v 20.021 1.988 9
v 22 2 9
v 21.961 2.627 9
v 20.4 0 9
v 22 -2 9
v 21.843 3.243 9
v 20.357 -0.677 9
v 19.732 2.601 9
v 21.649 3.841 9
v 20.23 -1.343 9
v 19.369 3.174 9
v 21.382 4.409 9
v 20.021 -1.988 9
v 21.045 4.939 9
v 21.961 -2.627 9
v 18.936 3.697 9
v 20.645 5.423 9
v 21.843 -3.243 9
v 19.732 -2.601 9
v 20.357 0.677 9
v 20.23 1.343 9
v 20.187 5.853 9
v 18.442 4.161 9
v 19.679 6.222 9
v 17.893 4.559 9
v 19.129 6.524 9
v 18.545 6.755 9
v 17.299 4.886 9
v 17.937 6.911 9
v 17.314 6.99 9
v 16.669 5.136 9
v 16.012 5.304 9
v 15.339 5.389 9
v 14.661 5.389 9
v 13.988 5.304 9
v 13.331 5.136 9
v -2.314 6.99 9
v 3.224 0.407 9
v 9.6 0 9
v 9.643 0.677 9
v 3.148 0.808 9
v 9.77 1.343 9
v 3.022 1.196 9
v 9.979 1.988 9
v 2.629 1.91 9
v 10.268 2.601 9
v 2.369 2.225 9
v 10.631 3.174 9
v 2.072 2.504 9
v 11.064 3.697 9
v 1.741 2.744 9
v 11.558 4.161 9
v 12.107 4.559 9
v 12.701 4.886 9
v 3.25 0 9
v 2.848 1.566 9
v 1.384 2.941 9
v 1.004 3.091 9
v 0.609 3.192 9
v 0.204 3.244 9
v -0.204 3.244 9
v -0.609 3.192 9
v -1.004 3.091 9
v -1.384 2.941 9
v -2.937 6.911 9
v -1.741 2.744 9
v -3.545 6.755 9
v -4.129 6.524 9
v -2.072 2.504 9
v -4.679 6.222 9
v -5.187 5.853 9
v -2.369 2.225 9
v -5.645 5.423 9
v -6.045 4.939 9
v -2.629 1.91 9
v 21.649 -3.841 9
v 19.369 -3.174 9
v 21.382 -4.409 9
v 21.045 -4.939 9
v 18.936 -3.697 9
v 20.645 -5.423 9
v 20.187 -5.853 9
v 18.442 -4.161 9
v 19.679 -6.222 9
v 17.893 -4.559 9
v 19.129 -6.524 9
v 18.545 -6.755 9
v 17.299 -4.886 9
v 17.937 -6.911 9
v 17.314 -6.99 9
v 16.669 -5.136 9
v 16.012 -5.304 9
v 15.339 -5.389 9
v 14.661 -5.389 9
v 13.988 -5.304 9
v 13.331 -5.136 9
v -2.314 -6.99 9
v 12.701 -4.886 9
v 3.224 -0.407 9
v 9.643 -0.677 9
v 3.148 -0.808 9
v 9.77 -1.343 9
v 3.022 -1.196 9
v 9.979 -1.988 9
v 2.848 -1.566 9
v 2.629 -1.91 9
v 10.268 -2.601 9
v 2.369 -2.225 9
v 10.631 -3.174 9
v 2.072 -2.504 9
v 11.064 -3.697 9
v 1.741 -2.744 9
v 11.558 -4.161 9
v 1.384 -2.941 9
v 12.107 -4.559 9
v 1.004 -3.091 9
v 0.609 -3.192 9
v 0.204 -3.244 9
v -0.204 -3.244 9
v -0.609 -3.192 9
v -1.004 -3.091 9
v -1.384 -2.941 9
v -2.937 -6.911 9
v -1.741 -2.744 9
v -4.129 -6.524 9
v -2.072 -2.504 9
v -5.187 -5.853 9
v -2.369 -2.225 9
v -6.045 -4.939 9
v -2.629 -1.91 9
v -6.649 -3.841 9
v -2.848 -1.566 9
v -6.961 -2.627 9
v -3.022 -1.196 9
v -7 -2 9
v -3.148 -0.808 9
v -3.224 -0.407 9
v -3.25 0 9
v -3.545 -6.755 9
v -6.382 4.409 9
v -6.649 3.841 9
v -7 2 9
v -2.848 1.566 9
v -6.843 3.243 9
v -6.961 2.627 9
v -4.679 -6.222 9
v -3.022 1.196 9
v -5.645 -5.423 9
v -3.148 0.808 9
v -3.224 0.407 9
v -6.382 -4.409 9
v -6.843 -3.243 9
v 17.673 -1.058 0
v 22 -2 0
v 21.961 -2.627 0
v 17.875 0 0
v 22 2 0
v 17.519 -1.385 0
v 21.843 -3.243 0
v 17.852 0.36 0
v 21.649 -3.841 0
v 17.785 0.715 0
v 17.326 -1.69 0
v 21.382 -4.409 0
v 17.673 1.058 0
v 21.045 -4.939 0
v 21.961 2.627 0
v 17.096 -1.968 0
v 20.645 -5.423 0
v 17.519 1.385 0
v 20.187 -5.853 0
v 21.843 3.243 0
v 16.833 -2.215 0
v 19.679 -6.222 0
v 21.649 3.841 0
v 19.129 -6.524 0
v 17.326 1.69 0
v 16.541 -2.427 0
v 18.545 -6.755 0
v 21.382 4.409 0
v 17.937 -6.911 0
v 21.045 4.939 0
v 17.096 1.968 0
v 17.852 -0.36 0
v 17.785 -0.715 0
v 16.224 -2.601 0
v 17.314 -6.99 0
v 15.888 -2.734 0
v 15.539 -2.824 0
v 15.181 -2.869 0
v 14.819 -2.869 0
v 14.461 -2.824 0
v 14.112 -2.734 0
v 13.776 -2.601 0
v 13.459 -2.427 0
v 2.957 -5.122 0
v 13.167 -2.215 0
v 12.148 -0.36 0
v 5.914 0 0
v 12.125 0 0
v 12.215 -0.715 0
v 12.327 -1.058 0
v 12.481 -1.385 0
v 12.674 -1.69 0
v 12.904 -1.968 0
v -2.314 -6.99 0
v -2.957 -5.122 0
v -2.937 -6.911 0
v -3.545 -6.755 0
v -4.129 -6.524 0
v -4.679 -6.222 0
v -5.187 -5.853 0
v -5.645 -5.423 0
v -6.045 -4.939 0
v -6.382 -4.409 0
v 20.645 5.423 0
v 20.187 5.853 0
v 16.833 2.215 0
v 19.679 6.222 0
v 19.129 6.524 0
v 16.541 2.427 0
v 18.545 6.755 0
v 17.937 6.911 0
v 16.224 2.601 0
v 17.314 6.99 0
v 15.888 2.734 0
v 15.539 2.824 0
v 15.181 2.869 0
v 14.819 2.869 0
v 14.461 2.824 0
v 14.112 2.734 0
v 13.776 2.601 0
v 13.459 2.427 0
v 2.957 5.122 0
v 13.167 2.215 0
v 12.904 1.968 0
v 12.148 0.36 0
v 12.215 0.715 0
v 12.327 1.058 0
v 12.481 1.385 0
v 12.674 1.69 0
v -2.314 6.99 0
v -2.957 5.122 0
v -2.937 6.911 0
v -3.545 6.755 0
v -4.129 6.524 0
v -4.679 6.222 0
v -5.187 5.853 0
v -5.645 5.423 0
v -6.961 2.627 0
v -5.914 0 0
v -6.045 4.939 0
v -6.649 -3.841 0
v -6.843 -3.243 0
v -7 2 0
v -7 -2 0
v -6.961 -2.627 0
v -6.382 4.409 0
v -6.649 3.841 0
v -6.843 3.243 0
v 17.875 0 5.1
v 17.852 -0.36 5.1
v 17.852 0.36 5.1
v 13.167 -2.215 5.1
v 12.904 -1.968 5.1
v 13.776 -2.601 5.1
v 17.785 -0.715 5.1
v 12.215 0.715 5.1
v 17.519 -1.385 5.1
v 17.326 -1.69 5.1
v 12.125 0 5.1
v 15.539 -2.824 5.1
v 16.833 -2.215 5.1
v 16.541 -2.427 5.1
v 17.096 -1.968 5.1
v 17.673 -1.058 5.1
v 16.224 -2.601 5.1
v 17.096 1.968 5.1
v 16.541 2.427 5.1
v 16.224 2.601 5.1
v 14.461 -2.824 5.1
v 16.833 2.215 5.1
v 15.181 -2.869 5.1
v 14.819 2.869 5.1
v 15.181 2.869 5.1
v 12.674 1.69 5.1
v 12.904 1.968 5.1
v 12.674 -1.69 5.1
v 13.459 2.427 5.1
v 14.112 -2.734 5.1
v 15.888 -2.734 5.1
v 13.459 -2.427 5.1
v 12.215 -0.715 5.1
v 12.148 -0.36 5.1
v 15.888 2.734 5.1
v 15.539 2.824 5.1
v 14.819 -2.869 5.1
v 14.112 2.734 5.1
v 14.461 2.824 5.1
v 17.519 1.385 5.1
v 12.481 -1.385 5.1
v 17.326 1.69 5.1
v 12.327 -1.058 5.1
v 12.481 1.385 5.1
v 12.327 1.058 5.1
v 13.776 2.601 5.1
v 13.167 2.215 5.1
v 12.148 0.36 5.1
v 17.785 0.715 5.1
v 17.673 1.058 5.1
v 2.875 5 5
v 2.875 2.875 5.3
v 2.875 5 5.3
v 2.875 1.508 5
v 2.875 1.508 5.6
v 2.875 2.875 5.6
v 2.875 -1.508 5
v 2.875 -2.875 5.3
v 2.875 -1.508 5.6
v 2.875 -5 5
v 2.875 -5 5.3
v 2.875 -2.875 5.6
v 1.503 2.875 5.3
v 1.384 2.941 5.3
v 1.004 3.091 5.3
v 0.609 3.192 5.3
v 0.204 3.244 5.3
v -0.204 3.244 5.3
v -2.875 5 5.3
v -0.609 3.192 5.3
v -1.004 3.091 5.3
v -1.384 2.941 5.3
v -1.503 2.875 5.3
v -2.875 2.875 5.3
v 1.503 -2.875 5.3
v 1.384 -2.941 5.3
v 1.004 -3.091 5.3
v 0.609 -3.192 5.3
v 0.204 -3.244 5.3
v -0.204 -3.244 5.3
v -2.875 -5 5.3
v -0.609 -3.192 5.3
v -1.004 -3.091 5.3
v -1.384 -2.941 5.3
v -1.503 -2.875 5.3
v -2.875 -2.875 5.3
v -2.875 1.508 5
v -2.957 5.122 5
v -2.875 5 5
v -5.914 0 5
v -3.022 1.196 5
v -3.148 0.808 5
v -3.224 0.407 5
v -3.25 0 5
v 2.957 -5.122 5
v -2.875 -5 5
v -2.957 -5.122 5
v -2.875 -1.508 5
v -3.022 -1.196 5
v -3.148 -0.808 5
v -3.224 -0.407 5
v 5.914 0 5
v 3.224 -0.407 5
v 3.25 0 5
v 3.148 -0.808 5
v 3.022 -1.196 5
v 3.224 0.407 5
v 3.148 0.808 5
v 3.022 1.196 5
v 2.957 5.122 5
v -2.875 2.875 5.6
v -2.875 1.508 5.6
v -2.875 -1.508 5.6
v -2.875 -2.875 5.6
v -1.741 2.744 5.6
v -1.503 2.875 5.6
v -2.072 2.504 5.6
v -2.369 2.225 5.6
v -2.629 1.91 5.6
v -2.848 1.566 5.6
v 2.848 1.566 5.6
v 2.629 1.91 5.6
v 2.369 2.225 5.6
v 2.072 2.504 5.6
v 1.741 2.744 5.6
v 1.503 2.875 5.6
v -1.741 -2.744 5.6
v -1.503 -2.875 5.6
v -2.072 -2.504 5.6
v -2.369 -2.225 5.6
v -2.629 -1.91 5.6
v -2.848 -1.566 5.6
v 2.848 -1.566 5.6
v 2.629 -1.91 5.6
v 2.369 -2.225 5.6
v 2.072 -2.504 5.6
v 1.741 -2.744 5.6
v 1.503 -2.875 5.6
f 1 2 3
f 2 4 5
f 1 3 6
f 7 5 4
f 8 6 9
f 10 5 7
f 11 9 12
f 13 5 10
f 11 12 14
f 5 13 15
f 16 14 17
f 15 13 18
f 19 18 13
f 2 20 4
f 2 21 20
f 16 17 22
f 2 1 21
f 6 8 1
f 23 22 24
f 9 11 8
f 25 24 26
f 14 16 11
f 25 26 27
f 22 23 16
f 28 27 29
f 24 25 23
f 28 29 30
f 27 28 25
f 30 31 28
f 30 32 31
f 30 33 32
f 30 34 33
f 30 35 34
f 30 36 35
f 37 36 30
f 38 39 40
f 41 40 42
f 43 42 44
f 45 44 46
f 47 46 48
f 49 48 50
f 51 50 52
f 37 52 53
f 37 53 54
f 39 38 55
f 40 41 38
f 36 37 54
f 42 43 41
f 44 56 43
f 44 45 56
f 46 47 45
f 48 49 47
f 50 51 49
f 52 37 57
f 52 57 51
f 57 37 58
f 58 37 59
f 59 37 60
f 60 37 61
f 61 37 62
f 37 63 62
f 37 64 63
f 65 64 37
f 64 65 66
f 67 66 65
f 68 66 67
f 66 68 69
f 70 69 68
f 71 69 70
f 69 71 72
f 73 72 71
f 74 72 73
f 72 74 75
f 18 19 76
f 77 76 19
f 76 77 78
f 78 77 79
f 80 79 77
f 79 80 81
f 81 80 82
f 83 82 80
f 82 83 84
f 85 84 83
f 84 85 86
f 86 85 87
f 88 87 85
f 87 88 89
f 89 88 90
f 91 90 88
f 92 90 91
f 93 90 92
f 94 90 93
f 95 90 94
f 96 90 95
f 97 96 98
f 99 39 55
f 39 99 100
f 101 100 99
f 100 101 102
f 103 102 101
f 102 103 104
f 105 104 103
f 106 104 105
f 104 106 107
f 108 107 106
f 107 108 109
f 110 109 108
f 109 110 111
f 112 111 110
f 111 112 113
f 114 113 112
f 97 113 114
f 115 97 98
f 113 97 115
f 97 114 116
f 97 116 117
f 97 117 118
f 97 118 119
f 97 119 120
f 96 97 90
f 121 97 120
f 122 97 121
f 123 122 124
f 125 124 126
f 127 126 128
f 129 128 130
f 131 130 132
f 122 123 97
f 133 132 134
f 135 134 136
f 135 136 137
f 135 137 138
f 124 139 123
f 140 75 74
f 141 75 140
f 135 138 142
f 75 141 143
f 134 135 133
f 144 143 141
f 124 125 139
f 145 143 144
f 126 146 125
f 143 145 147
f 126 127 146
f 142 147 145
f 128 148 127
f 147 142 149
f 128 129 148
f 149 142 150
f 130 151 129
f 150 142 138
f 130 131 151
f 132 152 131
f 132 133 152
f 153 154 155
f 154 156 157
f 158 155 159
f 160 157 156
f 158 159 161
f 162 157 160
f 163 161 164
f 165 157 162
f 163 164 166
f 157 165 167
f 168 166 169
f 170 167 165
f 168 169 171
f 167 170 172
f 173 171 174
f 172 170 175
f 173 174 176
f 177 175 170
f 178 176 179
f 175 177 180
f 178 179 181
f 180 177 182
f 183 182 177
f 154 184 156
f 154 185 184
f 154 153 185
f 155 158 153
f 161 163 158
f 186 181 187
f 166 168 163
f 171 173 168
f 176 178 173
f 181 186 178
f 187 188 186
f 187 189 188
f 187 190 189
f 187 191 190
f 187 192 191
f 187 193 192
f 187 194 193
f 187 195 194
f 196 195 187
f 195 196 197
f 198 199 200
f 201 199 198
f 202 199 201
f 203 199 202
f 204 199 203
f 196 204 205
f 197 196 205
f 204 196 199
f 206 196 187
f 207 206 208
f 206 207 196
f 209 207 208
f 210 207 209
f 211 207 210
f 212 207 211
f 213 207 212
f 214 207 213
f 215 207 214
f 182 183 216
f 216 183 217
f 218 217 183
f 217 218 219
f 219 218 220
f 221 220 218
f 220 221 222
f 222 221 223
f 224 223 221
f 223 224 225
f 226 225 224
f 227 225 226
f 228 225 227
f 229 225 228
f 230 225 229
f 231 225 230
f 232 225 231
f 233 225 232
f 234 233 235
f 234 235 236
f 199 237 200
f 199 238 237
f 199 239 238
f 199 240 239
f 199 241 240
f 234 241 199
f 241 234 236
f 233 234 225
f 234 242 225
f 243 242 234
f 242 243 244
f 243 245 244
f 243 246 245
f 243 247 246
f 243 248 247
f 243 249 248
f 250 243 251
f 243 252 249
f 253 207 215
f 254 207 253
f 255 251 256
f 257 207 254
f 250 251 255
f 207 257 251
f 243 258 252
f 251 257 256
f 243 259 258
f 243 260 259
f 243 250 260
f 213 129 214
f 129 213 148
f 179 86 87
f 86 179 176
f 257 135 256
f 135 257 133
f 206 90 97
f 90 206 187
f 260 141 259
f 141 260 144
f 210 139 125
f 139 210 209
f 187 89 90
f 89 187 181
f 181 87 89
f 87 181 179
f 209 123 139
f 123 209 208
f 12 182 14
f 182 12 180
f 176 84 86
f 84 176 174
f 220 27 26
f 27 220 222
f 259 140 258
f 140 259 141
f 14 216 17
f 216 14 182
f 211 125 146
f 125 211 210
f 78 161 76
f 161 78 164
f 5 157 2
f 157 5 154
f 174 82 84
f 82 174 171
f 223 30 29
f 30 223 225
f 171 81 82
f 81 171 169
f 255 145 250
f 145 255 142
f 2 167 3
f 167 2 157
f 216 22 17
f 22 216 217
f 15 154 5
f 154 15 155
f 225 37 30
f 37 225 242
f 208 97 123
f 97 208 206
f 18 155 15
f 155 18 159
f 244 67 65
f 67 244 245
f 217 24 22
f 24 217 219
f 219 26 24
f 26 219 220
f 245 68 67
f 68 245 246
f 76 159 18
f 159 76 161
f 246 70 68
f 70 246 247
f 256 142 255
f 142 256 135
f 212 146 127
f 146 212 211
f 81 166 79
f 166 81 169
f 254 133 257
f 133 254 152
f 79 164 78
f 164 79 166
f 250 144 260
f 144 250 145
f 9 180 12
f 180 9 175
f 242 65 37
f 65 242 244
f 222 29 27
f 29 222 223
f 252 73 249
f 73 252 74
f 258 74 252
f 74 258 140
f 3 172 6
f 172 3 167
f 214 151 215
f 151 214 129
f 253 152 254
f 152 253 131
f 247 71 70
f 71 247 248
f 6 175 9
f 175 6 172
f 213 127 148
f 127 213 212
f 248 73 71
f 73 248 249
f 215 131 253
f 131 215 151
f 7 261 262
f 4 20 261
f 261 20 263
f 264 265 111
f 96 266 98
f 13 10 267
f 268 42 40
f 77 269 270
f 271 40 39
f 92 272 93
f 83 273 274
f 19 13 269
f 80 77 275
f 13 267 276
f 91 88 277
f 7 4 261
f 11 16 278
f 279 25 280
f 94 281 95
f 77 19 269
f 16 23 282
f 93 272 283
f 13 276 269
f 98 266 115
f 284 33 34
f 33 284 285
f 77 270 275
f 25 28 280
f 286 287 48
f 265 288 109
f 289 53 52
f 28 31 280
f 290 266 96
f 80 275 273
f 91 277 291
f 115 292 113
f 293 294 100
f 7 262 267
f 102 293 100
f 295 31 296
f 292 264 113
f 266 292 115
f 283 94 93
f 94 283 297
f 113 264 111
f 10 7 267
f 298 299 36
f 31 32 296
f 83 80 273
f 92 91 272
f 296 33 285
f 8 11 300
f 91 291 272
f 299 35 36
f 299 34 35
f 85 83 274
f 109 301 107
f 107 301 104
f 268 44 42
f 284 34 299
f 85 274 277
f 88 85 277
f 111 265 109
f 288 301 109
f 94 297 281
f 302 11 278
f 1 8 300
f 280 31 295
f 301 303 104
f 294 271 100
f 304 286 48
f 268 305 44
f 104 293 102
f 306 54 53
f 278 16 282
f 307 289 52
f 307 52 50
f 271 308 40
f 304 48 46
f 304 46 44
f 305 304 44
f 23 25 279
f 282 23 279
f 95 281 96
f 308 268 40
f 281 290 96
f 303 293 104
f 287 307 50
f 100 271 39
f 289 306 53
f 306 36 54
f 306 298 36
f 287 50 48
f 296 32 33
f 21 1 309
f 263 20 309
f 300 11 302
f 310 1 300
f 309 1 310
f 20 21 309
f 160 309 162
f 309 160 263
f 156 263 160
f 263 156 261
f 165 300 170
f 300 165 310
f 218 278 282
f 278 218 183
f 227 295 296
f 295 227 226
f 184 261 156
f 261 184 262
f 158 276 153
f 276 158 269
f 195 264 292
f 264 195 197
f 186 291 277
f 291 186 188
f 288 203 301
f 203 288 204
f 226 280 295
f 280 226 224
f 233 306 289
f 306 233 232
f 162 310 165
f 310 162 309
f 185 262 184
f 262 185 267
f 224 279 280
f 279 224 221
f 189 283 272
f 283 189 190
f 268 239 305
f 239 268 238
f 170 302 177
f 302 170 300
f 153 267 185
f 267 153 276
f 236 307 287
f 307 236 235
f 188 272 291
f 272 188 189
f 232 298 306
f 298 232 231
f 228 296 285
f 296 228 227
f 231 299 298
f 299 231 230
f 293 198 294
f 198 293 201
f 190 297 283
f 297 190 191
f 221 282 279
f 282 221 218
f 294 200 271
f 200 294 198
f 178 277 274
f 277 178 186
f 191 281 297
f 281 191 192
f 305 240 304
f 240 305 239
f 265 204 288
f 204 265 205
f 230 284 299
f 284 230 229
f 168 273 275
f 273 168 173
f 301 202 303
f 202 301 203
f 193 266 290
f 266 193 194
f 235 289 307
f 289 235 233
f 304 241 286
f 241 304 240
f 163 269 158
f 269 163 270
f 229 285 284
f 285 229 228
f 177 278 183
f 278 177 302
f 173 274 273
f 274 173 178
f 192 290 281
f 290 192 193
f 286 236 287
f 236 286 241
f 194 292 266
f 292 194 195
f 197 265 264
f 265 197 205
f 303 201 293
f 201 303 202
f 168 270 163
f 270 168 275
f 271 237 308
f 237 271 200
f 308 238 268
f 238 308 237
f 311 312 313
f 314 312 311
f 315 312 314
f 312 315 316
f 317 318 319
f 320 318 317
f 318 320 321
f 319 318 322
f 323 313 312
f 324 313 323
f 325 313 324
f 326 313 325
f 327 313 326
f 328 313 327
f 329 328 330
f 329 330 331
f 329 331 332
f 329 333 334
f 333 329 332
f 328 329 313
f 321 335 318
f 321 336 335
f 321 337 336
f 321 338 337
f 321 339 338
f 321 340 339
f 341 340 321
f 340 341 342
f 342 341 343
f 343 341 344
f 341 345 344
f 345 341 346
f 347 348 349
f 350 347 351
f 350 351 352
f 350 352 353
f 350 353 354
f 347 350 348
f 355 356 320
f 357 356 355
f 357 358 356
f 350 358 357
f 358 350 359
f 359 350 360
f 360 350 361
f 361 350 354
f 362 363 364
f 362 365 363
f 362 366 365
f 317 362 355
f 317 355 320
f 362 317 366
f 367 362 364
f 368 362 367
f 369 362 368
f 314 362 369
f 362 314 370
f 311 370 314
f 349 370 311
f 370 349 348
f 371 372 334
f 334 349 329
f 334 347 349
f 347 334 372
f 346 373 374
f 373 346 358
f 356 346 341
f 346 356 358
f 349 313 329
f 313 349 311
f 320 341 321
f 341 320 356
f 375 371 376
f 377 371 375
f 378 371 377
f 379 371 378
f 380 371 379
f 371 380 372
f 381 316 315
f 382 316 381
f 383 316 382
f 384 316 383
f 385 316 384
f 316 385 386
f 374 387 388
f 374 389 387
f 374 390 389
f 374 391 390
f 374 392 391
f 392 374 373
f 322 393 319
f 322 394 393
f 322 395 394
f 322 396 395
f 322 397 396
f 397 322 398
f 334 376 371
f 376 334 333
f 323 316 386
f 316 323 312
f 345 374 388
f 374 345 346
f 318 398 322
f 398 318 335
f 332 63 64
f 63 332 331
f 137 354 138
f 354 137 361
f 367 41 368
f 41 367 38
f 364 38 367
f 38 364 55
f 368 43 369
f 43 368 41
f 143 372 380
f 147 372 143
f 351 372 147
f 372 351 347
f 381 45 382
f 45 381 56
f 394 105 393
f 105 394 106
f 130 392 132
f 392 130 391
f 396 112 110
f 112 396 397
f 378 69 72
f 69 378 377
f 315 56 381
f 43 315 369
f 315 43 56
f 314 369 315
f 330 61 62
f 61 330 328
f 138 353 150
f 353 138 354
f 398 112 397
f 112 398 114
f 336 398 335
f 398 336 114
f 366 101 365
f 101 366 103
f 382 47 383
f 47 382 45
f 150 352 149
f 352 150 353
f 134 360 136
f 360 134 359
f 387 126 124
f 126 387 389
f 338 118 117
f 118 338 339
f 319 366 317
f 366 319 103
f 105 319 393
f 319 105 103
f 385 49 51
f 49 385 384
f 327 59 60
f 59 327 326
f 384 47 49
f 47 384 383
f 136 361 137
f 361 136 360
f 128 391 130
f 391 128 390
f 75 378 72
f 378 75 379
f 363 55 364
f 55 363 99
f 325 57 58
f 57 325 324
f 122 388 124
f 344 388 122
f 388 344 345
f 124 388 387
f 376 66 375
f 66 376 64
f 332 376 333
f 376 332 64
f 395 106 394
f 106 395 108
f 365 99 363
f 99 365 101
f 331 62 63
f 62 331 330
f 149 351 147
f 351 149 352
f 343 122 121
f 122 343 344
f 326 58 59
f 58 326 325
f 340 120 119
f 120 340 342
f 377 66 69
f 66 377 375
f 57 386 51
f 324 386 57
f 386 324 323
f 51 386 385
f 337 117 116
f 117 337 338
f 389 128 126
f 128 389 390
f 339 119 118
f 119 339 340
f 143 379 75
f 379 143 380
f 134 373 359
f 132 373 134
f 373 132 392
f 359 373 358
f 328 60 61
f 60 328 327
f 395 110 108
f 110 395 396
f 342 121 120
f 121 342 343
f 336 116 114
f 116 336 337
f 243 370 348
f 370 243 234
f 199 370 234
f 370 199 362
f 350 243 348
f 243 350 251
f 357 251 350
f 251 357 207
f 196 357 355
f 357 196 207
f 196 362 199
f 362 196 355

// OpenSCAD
$fn = 50;


difference() {
	union() {
		cylinder(h = 9, r = 7.0000000000);
		translate(v = [7.5000000000, 0.0000000000, 0]) {
			hull() {
				translate(v = [-9.5000000000, 2.0000000000, 0]) {
					cylinder(h = 9, r = 5);
				}
				translate(v = [9.5000000000, 2.0000000000, 0]) {
					cylinder(h = 9, r = 5);
				}
				translate(v = [-9.5000000000, -2.0000000000, 0]) {
					cylinder(h = 9, r = 5);
				}
				translate(v = [9.5000000000, -2.0000000000, 0]) {
					cylinder(h = 9, r = 5);
				}
			}
		}
		translate(v = [7.5000000000, 0.0000000000, 0]) {
			hull() {
				translate(v = [-9.5000000000, 2.0000000000, 0]) {
					cylinder(h = 9, r = 5);
				}
				translate(v = [9.5000000000, 2.0000000000, 0]) {
					cylinder(h = 9, r = 5);
				}
				translate(v = [-9.5000000000, -2.0000000000, 0]) {
					cylinder(h = 9, r = 5);
				}
				translate(v = [9.5000000000, -2.0000000000, 0]) {
					cylinder(h = 9, r = 5);
				}
			}
		}
	}
	union() {
		translate(v = [15.0000000000, 0.0000000000, 9]) {
			rotate(a = [0, 0, 0]) {
				difference() {
					union() {
						#translate(v = [0, 0, -9.0000000000]) {
							cylinder(h = 9, r = 2.6000000000);
						}
						#translate(v = [0, 0, -3.9000000000]) {
							cylinder(h = 3.9000000000, r1 = 2.8750000000, r2 = 5.4000000000);
						}
						#translate(v = [0, 0, -9.0000000000]) {
							cylinder(h = 9, r = 2.8750000000);
						}
						#translate(v = [0, 0, -9.0000000000]) {
							cylinder(h = 9, r = 2.6000000000);
						}
					}
					union();
				}
			}
		}
		translate(v = [15.0000000000, 0.0000000000, 9]) {
			rotate(a = [0, 0, 0]) {
				difference() {
					union() {
						#translate(v = [0, 0, -9.0000000000]) {
							cylinder(h = 9, r = 2.6000000000);
						}
						#translate(v = [0, 0, -3.9000000000]) {
							cylinder(h = 3.9000000000, r1 = 2.8750000000, r2 = 5.4000000000);
						}
						#translate(v = [0, 0, -9.0000000000]) {
							cylinder(h = 9, r = 2.8750000000);
						}
						#translate(v = [0, 0, -9.0000000000]) {
							cylinder(h = 9, r = 2.6000000000);
						}
					}
					union();
				}
			}
		}
		translate(v = [0.0000000000, 0.0000000000, 0]) {
			rotate(a = [0, 0, 0]) {
				difference() {
					union() {
						#translate(v = [-2.8750000000, -5.0000000000, -0.3000000000]) {
							cube(size = [5.7500000000, 10, 0.3000000000]);
						}
						#translate(v = [-2.8750000000, -2.8750000000, -0.6000000000]) {
							cube(size = [5.7500000000, 5.7500000000, 0.3000000000]);
						}
						#translate(v = [-2.8750000000, -5.0000000000, 5]) {
							cube(size = [5.7500000000, 10, 0.3000000000]);
						}
						#translate(v = [-2.8750000000, -2.8750000000, 5.3000000000]) {
							cube(size = [5.7500000000, 5.7500000000, 0.3000000000]);
						}
						#translate(v = [0, 0, -100.0000000000]) {
							cylinder(h = 200, r = 3.2500000000);
						}
						#linear_extrude(height = 5) {
							polygon(points = [[5.9142500000, 0.0000000000], [2.9571250000, 5.1218907443], [-2.9571250000, 5.1218907443], [-5.9142500000, 0.0000000000], [-2.9571250000, -5.1218907443], [2.9571250000, -5.1218907443]]);
						}
						#translate(v = [-2.8750000000, -5.0000000000, -0.3000000000]) {
							cube(size = [5.7500000000, 10, 0.3000000000]);
						}
						#translate(v = [-2.8750000000, -2.8750000000, -0.6000000000]) {
							cube(size = [5.7500000000, 5.7500000000, 0.3000000000]);
						}
						#translate(v = [-2.8750000000, -5.0000000000, 5]) {
							cube(size = [5.7500000000, 10, 0.3000000000]);
						}
						#translate(v = [-2.8750000000, -2.8750000000, 5.3000000000]) {
							cube(size = [5.7500000000, 5.7500000000, 0.3000000000]);
						}
						#translate(v = [0, 0, -100.0000000000]) {
							cylinder(h = 200, r = 3.2500000000);
						}
						#translate(v = [-2.8750000000, -5.0000000000, -0.3000000000]) {
							cube(size = [5.7500000000, 10, 0.3000000000]);
						}
						#translate(v = [-2.8750000000, -2.8750000000, -0.6000000000]) {
							cube(size = [5.7500000000, 5.7500000000, 0.3000000000]);
						}
						#translate(v = [-2.8750000000, -5.0000000000, 5]) {
							cube(size = [5.7500000000, 10, 0.3000000000]);
						}
						#translate(v = [-2.8750000000, -2.8750000000, 5.3000000000]) {
							cube(size = [5.7500000000, 5.7500000000, 0.3000000000]);
						}
						#translate(v = [0, 0, -100.0000000000]) {
							cylinder(h = 200, r = 3.2500000000);
						}
					}
					union();
				}
			}
		}
		translate(v = [0, 0, -100]) {
			cylinder(h = 200, r = 3.2500000000);
		}
		translate(v = [0, 0, -100]) {
			cylinder(h = 200, r = 1.8000000000);
		}
	}
}
